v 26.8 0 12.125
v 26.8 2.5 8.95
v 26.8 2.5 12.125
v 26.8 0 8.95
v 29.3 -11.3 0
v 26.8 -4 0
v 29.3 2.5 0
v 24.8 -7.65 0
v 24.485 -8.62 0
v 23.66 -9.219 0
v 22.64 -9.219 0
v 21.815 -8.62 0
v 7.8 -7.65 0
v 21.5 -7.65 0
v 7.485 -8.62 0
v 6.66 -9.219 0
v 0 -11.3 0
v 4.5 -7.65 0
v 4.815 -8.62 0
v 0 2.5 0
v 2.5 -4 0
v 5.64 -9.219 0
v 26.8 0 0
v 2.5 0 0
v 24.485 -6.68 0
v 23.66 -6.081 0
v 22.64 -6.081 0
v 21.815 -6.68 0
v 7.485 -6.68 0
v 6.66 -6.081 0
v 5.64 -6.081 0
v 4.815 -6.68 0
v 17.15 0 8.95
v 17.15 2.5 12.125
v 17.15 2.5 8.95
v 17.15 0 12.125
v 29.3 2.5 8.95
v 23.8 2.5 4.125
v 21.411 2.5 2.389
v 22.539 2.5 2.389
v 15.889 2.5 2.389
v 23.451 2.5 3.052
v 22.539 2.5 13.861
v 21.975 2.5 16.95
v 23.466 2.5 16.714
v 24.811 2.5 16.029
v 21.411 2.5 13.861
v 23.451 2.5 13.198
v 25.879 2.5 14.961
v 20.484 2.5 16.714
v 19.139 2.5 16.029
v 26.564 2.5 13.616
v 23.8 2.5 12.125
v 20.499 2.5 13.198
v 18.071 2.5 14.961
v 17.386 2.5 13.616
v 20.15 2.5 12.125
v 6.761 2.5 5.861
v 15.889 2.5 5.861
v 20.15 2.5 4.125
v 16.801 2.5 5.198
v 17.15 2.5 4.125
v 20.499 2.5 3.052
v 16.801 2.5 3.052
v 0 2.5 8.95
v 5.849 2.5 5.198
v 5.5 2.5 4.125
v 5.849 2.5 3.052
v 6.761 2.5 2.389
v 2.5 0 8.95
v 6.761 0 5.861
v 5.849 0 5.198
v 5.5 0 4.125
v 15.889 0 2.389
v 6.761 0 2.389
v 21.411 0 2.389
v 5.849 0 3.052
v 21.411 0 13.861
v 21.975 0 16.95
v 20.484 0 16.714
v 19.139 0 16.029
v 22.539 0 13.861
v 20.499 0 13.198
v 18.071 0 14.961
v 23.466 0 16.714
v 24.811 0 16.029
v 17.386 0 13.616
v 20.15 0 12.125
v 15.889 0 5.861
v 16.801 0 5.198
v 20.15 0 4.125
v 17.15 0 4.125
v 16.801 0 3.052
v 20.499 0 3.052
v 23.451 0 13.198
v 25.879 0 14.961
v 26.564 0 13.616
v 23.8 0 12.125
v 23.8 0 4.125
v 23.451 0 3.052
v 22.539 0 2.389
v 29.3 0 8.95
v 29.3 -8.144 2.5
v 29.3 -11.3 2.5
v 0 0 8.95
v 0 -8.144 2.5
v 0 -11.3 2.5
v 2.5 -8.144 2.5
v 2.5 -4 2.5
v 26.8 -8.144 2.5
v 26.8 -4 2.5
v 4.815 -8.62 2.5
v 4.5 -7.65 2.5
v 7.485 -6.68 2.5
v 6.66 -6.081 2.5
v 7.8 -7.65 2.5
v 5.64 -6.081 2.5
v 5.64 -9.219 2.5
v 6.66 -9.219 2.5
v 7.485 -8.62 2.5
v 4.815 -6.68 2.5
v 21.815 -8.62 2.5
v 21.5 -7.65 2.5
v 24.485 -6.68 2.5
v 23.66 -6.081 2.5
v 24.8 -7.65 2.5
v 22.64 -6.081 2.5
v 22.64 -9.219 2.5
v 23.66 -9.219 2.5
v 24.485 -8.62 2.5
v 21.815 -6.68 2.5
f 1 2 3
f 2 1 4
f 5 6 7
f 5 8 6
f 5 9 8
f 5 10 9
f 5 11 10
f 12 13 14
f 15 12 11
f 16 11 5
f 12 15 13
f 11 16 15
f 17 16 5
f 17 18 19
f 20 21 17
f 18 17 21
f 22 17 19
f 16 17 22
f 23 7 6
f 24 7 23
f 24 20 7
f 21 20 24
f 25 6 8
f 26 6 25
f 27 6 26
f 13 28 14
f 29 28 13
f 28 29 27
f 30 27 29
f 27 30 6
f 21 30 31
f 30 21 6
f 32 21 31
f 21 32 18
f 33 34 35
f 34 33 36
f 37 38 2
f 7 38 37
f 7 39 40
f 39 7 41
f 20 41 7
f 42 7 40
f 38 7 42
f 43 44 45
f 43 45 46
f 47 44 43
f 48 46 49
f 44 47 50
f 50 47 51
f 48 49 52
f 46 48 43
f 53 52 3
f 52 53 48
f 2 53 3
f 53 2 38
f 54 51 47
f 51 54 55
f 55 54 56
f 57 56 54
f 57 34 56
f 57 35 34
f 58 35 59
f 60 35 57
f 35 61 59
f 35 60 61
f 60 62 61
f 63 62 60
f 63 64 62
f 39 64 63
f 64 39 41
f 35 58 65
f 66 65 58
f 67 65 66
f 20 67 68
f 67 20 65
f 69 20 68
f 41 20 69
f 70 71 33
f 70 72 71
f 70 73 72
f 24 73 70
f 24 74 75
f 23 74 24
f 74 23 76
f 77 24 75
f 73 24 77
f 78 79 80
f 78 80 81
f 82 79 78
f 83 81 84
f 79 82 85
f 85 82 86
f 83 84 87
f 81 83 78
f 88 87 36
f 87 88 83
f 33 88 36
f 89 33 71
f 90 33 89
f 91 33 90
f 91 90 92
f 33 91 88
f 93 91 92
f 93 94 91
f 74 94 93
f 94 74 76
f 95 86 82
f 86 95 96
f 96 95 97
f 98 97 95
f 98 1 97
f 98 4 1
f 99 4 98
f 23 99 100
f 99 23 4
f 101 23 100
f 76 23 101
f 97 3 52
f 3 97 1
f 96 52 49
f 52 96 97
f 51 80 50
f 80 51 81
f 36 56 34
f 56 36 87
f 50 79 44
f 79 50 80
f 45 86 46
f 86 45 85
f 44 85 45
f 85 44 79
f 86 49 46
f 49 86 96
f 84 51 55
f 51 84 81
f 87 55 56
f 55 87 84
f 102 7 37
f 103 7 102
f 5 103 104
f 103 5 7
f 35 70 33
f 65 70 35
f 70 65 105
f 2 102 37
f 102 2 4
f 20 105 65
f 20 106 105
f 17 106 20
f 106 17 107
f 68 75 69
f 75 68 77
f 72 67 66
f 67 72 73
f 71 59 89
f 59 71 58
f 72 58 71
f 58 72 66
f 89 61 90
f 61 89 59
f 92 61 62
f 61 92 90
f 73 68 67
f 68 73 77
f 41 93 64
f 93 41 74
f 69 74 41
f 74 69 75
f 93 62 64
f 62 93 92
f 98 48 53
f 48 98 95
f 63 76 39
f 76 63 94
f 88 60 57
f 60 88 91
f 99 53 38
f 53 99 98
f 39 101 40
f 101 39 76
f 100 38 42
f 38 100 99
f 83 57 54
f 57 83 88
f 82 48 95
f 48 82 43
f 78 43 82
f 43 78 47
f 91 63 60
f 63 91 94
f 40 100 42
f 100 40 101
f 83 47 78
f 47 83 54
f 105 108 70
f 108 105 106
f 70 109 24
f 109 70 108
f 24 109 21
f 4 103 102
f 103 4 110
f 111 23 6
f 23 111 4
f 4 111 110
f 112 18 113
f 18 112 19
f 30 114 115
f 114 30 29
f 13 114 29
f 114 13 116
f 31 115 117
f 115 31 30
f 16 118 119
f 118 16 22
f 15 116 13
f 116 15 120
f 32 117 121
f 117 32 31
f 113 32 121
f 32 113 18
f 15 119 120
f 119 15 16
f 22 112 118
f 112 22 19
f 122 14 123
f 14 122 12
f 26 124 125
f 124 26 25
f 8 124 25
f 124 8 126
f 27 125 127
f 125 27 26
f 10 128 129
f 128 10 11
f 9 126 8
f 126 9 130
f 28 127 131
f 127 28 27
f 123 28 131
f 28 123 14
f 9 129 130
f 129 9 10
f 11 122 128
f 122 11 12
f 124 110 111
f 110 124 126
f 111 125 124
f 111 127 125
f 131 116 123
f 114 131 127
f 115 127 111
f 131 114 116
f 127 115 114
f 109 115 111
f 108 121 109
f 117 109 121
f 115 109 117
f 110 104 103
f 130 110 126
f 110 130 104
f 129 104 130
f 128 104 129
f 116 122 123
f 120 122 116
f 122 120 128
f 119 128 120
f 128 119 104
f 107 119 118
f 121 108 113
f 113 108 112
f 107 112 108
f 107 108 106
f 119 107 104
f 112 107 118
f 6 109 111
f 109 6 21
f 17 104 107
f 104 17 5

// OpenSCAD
// Number of Slots
slotConfig = 3;  // 0, 1, 2, 3

// Thickness of the base portion of the bracket
baseDepth = 2.5;

// Diameter of base holes
baseDiameter = 3.3; 

// Distance between holes and edge
baseAllowance = 2;

// Space between inner surface of bracket platform and side of mounting platform. 
baseDistance = 4;

// Slot instead of double holes?
baseSlot = false; // true, false

// Thickness of the slot portion of the bracket.
slotDepth = 2.5; 

// Vertical Length of Slot
vSlotLength = 8;  

// Horizontal Length of Slot
hSlotLength = 8;

// Diameter of slot holes
slotDiameter = 3.65;

// Minimum distance between slot side and any edge/obstruction
slotAllowance = 3;

// The height off of the bottom of the bracket that the hole starts. Measured from bottom of hole. 
slotHeight = 2.3;

// Width of triangular prisms that hold the base to the bracket
supportWidth = 2.5; 

// Change to true if you would like the vertical slot on the other side (Only for slotConfig = 3)
bracketMirror = false;  // true, false

//////// Do not edit any of these variables ////////

baseLength = 
[2*supportWidth+2*slotAllowance+slotDiameter, // slotConfig = 0
2*supportWidth+2*slotAllowance+slotDiameter+hSlotLength, // slotConfig = 1
2*supportWidth+2*slotAllowance+slotDiameter, // slotConfig = 2
2*supportWidth+3*slotAllowance+2*slotDiameter+hSlotLength // slotConfig = 3
];

transVal = [supportWidth+slotAllowance+slotDiameter/2, 0, supportWidth, baseLength[slotConfig]-(2*slotAllowance+slotDiameter)-supportWidth]; // Why can't I assign variable values in IF statements?

polyPoi = 
[[0, 0, slotHeight+slotDiameter+slotAllowance], 
[supportWidth, 0, slotHeight+slotDiameter+slotAllowance], 
[supportWidth, 0, 0], 
[0, 0, 0], 
[0, -(baseDistance+2*baseAllowance+baseDiameter), 0], 
[supportWidth, -(baseDistance+2*baseAllowance+baseDiameter), 0]];

polyTri = [[0,3,2], [0,2,1],  [3,0,4], [1,2,5], [0,5,4], [0,1,5],  [5,2,4], [4,2,3], ]; // Thank you OpenSCAD User Manual! <3

//////////////////

module bracketMount(){
	module hSlotPositive(){
		if (slotConfig == 0){
			cube([baseLength[slotConfig],slotDepth,slotHeight+slotDiameter+slotAllowance]);
		}
		if (slotConfig != 0 && slotConfig != 2){
			cube([baseLength[slotConfig],slotDepth,slotHeight+slotDiameter+slotAllowance]);
		} // Well that was boring
		if (slotConfig != 0 && slotConfig != 1){
			translate([transVal[slotConfig], 0, 0]) union(){
				cube([2*slotAllowance+slotDiameter, slotDepth, slotHeight+slotDiameter/2+vSlotLength]);
				translate([slotAllowance+slotDiameter/2,slotDepth,slotHeight+slotDiameter/2+vSlotLength])
					rotate([90,0,0])
						cylinder(r=(slotAllowance+slotDiameter/2), h=slotDepth, $fn=20);
			}
			cube([baseLength[slotConfig],slotDepth,slotHeight+slotDiameter+slotAllowance]);
		} // If I said this unit wasn't partially guessing stuff I would be lying
	}
	module hSlotNegative(){
		if (slotConfig == 0){
			translate([transVal[slotConfig],slotDepth+1,slotHeight+slotDiameter/2])
			rotate([90,0,0]) 
				cylinder(r=slotDiameter/2, h=slotDepth+2, $fn=10);
		}
		if (slotConfig != 0 && slotConfig != 2){
			translate([slotAllowance+supportWidth+slotDiameter/2,slotDepth+1,slotHeight+slotDiameter/2])
			rotate([90,0,0]) 
				hull(){
					cylinder(r=slotDiameter/2, h=slotDepth+2, $fn=10);
					translate([hSlotLength,0,0])
						cylinder(r=slotDiameter/2, h=slotDepth+2, $fn=10);
				} // Hooray hulls! Making my life that much easier.
		}
		if (slotConfig != 0 && slotConfig != 1){
			translate([transVal[slotConfig]+slotAllowance+slotDiameter/2,slotDepth+1,slotHeight+slotDiameter/2])
			rotate([90,0,0]) 
				hull(){
					cylinder(r=slotDiameter/2, h=slotDepth+2, $fn=10);
					translate([0,vSlotLength,0])
						cylinder(r=slotDiameter/2, h=slotDepth+2, $fn=10);
				}
		}
	}
	difference(){
		hSlotPositive();
		hSlotNegative();
	}
}

module triangularSupport(){
polyhedron (points = polyPoi, triangles = polyTri);
translate([baseLength[slotConfig]-supportWidth,0,0])
	polyhedron (points = polyPoi, triangles = polyTri);
}

module baseMount(){
	module positiveBase(){
		translate([0,-baseDistance,0]) mirror([0,1,0])
			cube([baseLength[slotConfig], 2*baseAllowance+baseDiameter, baseDepth]);
	}
	module negativeBase(){
		if (baseSlot){
			translate([baseAllowance+supportWidth+baseDiameter/2,-baseDistance-baseAllowance-baseDiameter/2,-1]) hull(){
				cylinder(r=baseDiameter/2, h=baseDepth+2, $fn=10);
				translate([baseLength[slotConfig]-2*baseAllowance-2*supportWidth-baseDiameter,0,0])
					cylinder(r=baseDiameter/2, h=baseDepth+2, $fn=10);
			}
		} else {
			translate([baseAllowance+supportWidth+baseDiameter/2,-baseDistance-baseAllowance-baseDiameter/2,-1]) union(){
				cylinder(r=baseDiameter/2, h=baseDepth+2, $fn=10);
				translate([baseLength[slotConfig]-2*baseAllowance-2*supportWidth-baseDiameter,0,0])
					cylinder(r=baseDiameter/2, h=baseDepth+2, $fn=10);
			}
		}
	}
	difference(){
		positiveBase();
		negativeBase();
	}
}

if (bracketMirror){
mirror([1,0,0]){
bracketMount();
triangularSupport();
baseMount();
}
} else {
bracketMount();
triangularSupport();
baseMount();
}
